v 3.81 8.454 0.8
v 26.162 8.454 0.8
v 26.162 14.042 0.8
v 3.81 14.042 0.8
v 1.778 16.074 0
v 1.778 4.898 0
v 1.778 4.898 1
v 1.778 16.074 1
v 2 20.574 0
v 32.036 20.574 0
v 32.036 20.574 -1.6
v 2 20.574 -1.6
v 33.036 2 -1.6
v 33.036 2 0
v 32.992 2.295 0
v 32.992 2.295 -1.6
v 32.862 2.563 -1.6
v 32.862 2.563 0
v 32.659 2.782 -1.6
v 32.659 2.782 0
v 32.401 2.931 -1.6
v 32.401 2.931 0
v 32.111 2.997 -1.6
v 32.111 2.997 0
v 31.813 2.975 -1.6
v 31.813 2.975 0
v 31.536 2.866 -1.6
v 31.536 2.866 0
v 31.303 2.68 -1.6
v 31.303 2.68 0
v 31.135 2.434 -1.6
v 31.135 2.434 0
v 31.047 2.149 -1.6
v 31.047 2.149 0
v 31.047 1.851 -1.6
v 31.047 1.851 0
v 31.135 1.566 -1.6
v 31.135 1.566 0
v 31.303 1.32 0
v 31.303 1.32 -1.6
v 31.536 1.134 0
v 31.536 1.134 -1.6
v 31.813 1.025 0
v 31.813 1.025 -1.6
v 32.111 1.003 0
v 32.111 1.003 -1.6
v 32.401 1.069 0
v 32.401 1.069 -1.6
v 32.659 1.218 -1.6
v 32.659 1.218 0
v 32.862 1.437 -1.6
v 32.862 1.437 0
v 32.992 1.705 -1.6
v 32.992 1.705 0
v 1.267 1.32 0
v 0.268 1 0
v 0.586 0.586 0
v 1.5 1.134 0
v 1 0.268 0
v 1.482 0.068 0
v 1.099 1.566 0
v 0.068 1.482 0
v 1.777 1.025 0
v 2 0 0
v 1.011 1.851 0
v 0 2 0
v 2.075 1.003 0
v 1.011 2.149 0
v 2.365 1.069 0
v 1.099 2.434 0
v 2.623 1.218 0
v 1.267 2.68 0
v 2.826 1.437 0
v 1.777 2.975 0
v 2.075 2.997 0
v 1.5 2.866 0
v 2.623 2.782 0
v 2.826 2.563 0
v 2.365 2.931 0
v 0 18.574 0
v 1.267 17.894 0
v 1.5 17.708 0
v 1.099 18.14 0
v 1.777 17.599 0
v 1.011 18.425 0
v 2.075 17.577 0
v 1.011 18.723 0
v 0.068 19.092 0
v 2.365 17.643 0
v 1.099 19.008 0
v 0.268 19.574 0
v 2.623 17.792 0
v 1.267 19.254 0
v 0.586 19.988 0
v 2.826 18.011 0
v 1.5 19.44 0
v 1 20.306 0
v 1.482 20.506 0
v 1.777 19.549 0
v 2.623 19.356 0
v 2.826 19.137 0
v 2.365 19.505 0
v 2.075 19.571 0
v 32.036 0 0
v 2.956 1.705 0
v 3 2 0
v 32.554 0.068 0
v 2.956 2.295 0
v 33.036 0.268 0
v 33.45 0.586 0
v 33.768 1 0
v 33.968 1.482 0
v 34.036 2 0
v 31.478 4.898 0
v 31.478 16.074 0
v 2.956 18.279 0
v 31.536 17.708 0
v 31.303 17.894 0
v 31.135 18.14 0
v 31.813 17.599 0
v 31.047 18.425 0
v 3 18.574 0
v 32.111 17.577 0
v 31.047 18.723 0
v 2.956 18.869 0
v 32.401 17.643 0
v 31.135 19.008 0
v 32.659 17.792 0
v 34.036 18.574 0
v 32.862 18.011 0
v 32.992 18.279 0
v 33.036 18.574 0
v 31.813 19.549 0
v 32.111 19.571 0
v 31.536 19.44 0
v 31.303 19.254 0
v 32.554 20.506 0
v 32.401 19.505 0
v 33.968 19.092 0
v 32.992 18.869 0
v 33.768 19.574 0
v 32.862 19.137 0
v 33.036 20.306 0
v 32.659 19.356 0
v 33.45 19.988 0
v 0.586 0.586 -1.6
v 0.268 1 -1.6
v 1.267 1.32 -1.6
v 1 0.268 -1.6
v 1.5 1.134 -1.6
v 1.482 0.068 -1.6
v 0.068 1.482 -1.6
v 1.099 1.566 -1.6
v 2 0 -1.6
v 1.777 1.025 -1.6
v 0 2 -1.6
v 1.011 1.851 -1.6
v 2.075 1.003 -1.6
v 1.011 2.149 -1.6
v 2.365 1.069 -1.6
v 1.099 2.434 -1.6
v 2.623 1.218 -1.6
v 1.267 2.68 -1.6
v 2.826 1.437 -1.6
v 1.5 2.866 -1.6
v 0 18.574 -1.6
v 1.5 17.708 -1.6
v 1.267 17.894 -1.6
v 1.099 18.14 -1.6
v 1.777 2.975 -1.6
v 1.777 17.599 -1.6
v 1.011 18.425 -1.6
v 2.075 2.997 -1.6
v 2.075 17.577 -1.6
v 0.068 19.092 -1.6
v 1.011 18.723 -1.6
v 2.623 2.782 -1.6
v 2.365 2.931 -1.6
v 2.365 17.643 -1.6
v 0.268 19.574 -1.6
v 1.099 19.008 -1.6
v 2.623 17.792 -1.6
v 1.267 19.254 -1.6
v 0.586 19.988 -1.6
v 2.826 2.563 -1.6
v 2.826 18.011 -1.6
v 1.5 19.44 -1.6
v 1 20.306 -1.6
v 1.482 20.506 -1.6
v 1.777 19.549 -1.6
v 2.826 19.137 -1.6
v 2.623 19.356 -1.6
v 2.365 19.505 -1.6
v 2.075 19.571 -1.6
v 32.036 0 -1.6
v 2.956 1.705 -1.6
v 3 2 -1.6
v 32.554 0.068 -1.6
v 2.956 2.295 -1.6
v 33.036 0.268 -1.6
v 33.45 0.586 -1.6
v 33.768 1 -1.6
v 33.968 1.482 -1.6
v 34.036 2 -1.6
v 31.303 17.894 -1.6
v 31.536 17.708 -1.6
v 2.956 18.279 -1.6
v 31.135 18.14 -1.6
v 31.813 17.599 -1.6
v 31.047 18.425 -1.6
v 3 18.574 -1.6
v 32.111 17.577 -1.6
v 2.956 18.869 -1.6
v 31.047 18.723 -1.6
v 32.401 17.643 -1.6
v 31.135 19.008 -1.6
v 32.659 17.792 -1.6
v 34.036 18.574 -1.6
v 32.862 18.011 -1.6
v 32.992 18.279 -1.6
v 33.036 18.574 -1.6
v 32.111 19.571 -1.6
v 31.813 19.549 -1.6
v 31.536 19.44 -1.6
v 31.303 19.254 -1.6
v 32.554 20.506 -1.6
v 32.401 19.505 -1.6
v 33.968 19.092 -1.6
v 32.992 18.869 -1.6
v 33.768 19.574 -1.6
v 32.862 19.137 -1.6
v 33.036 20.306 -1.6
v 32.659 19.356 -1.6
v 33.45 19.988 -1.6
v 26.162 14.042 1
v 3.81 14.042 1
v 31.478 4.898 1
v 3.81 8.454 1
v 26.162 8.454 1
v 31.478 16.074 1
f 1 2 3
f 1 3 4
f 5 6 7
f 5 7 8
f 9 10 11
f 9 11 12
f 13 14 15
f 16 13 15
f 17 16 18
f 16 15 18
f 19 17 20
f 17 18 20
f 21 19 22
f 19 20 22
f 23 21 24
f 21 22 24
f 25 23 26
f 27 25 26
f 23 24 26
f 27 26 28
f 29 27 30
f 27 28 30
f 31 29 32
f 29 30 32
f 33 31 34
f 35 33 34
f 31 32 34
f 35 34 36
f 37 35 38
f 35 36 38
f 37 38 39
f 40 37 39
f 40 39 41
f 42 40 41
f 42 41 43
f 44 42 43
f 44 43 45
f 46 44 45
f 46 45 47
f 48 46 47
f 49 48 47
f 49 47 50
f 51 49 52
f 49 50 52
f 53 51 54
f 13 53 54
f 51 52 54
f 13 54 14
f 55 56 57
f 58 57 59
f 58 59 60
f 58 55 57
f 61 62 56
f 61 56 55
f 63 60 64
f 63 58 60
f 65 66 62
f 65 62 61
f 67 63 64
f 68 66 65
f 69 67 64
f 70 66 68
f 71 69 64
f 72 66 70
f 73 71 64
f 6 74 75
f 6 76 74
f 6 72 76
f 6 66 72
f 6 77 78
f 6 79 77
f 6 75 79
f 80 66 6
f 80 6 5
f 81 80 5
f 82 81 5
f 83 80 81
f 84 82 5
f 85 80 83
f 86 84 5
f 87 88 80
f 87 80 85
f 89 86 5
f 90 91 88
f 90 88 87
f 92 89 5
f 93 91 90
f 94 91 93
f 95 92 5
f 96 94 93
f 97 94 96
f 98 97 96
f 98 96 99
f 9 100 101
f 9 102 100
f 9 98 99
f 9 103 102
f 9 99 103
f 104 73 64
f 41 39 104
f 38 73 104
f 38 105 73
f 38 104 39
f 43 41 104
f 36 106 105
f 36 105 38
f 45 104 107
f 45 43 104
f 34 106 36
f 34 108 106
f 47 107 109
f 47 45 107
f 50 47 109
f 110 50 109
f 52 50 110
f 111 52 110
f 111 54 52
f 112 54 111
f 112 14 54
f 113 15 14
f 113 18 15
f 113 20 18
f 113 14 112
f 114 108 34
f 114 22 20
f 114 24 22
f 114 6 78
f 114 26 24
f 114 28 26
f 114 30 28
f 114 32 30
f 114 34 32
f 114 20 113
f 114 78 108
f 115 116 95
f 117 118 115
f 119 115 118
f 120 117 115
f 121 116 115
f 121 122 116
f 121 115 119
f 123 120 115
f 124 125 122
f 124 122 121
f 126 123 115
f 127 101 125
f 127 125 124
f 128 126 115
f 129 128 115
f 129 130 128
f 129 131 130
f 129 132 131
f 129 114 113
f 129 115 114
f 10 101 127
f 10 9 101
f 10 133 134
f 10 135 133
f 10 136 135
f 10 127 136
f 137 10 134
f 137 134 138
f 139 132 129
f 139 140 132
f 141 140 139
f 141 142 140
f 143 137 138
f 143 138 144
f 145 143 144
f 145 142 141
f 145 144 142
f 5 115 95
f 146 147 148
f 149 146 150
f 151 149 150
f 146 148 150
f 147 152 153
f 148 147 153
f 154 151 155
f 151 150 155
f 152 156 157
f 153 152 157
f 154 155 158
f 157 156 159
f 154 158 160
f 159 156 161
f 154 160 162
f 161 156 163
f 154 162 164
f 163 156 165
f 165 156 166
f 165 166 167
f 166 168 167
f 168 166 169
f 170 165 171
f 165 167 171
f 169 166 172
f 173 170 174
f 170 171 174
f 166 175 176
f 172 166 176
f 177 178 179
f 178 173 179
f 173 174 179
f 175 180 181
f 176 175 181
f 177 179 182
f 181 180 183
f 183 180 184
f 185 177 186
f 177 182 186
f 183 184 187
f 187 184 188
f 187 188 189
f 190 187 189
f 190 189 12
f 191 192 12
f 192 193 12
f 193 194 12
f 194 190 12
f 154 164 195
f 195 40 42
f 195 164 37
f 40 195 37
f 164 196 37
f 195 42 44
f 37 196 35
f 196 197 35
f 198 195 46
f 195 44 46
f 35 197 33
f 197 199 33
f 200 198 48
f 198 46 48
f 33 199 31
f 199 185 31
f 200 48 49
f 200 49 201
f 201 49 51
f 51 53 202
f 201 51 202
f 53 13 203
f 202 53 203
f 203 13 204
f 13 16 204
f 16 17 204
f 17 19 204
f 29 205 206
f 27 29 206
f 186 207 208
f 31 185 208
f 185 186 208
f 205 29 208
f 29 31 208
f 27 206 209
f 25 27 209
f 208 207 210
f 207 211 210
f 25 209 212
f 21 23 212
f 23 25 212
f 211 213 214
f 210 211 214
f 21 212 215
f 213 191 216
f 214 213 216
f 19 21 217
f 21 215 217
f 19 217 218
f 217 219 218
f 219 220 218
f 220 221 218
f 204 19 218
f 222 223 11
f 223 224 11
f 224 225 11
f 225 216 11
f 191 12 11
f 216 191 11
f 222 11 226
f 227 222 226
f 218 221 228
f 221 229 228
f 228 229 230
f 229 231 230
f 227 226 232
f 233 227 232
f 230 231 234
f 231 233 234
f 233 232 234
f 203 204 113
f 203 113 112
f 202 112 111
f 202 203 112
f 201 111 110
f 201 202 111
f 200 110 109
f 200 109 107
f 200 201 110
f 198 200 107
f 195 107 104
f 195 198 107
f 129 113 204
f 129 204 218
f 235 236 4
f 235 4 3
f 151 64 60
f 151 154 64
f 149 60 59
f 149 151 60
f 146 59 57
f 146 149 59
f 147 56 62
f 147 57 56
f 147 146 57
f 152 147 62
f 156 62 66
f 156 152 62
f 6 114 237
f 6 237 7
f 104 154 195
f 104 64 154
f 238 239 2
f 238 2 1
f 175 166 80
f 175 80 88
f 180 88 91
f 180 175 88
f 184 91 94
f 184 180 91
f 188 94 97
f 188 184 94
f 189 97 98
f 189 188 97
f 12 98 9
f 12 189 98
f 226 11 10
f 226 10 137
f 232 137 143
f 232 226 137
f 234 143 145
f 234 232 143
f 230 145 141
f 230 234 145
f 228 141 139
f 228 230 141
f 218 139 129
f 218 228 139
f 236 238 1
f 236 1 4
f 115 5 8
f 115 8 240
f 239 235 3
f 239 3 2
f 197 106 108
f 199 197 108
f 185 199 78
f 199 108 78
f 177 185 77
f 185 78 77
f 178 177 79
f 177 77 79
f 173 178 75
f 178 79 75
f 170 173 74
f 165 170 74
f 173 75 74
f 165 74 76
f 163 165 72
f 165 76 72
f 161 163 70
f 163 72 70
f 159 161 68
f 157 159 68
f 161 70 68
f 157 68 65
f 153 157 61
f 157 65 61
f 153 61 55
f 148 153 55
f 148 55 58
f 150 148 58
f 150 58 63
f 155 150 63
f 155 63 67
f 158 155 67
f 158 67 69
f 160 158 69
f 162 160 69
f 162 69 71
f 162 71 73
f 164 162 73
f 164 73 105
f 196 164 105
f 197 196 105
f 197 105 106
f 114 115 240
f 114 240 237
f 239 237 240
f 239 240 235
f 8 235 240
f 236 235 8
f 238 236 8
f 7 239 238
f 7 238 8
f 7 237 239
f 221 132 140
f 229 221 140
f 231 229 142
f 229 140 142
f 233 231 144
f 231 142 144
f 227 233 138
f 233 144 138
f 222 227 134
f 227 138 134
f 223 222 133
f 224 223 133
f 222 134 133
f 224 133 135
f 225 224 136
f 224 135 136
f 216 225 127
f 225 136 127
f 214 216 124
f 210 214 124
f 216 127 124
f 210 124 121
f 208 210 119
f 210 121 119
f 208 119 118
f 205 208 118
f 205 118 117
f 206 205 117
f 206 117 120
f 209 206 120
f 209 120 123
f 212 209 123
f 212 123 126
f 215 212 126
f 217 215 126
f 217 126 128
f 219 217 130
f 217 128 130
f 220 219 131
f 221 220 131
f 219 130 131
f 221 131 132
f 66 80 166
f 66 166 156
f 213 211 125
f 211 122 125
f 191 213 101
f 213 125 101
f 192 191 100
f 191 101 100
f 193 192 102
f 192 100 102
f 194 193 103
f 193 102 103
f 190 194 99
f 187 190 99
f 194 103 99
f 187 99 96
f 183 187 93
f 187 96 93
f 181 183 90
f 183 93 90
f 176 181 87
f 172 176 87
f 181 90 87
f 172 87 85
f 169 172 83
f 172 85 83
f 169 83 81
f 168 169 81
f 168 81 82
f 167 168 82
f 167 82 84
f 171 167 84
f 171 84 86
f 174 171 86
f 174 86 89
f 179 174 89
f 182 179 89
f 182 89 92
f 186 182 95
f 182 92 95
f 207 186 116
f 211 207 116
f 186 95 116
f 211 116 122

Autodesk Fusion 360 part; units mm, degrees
sketch "Sketch1" plane through (0, 0, 0) normal (0, 0, 1) x (1, 0, 0)
  line L0 (0, 0) -> (34.036, 0)
  line L1 (34.036, 0) -> (34.036, 20.574)
  line L2 (34.036, 20.574) -> (0, 20.574)
  line L3 (0, 20.574) -> (0, 0)
  circle A0 centre (2, 18.574) radius 1
  line L4 (17.018, 20.574) -> (17.018, 0) construction
  line L5 (34.036, 10.287) -> (0, 10.287) construction
  circle A1 centre (32.036, 18.574) radius 1
  circle A2 centre (32.036, 2) radius 1
  circle A3 centre (2, 2) radius 1
  dimension "d1" = 34.036
  dimension "d2" = 20.574
  dimension "d3" = 2
  dimension "d5" = 2
  dimension "d23" = 2
extrude "Extrude1" add sketch "Sketch1" against normal blind 1.6
fillet "Fillet1" radius 2 4 edges at (0, 0, -0.8) (0, 20.574, -0.8) (34.036, 20.574, -0.8) (34.036, 0, -0.8)
sketch "Sketch2" plane through (0, 0, 0) normal (0, 0, 1) x (-1, 0, 0)
  arc A0 (-32.036, 0) -> (-34.036, -2) centre (-32.036, -2) ccw
  line L0 (-34.036, -2) -> (-34.036, -18.574)
  arc A1 (-34.036, -18.574) -> (-32.036, -20.574) centre (-32.036, -18.574) ccw
  line L1 (-32.036, -20.574) -> (-2, -20.574)
  arc A2 (-2, -20.574) -> (0, -18.574) centre (-2, -18.574) ccw
  line L2 (0, -18.574) -> (0, -2)
  arc A3 (0, -2) -> (-2, 0) centre (-2, -2) ccw
  line L3 (-2, 0) -> (-32.036, 0)
  circle A4 centre (-2, -2) radius 1
  circle A5 centre (-32.036, -18.574) radius 1
  circle A6 centre (-2, -18.574) radius 1
  circle A7 centre (-32.036, -2) radius 1
  line L4 (-1.778, -16.074) -> (-31.478, -16.074)
  line L5 (-31.478, -16.074) -> (-31.478, -4.898)
  line L6 (-31.478, -4.898) -> (-1.778, -4.898)
  line L7 (-1.778, -4.898) -> (-1.778, -16.074)
  dimension "d24" = 29.7
  dimension "d25" = 11.176
  dimension "d26" = 4.5
  dimension "d27" = 1.778
extrude "Extrude2" add sketch "Sketch2" along normal blind 1 contours L4 L5 L6 L7
sketch "Sketch3" plane through (0, 0, 1) normal (0, 0, 1) x (-1, 0, 0)
  line L0 (-1.778, -4.898) -> (-31.478, -4.898)
  line L1 (-31.478, -4.898) -> (-31.478, -16.074)
  line L2 (-31.478, -16.074) -> (-1.778, -16.074)
  line L3 (-1.778, -16.074) -> (-1.778, -4.898)
  line L4 (-3.81, -14.042) -> (-26.162, -14.042)
  line L5 (-26.162, -14.042) -> (-26.162, -8.454)
  line L6 (-26.162, -8.454) -> (-3.81, -8.454)
  line L7 (-3.81, -8.454) -> (-3.81, -14.042)
  dimension "d30" = 2.032
  dimension "d31" = 22.352
  dimension "d32" = 5.588
  dimension "d33" = 2.032
extrude "Extrude3" cut sketch "Sketch3" against normal blind 0.2 contours L4 L5 L6 L7
